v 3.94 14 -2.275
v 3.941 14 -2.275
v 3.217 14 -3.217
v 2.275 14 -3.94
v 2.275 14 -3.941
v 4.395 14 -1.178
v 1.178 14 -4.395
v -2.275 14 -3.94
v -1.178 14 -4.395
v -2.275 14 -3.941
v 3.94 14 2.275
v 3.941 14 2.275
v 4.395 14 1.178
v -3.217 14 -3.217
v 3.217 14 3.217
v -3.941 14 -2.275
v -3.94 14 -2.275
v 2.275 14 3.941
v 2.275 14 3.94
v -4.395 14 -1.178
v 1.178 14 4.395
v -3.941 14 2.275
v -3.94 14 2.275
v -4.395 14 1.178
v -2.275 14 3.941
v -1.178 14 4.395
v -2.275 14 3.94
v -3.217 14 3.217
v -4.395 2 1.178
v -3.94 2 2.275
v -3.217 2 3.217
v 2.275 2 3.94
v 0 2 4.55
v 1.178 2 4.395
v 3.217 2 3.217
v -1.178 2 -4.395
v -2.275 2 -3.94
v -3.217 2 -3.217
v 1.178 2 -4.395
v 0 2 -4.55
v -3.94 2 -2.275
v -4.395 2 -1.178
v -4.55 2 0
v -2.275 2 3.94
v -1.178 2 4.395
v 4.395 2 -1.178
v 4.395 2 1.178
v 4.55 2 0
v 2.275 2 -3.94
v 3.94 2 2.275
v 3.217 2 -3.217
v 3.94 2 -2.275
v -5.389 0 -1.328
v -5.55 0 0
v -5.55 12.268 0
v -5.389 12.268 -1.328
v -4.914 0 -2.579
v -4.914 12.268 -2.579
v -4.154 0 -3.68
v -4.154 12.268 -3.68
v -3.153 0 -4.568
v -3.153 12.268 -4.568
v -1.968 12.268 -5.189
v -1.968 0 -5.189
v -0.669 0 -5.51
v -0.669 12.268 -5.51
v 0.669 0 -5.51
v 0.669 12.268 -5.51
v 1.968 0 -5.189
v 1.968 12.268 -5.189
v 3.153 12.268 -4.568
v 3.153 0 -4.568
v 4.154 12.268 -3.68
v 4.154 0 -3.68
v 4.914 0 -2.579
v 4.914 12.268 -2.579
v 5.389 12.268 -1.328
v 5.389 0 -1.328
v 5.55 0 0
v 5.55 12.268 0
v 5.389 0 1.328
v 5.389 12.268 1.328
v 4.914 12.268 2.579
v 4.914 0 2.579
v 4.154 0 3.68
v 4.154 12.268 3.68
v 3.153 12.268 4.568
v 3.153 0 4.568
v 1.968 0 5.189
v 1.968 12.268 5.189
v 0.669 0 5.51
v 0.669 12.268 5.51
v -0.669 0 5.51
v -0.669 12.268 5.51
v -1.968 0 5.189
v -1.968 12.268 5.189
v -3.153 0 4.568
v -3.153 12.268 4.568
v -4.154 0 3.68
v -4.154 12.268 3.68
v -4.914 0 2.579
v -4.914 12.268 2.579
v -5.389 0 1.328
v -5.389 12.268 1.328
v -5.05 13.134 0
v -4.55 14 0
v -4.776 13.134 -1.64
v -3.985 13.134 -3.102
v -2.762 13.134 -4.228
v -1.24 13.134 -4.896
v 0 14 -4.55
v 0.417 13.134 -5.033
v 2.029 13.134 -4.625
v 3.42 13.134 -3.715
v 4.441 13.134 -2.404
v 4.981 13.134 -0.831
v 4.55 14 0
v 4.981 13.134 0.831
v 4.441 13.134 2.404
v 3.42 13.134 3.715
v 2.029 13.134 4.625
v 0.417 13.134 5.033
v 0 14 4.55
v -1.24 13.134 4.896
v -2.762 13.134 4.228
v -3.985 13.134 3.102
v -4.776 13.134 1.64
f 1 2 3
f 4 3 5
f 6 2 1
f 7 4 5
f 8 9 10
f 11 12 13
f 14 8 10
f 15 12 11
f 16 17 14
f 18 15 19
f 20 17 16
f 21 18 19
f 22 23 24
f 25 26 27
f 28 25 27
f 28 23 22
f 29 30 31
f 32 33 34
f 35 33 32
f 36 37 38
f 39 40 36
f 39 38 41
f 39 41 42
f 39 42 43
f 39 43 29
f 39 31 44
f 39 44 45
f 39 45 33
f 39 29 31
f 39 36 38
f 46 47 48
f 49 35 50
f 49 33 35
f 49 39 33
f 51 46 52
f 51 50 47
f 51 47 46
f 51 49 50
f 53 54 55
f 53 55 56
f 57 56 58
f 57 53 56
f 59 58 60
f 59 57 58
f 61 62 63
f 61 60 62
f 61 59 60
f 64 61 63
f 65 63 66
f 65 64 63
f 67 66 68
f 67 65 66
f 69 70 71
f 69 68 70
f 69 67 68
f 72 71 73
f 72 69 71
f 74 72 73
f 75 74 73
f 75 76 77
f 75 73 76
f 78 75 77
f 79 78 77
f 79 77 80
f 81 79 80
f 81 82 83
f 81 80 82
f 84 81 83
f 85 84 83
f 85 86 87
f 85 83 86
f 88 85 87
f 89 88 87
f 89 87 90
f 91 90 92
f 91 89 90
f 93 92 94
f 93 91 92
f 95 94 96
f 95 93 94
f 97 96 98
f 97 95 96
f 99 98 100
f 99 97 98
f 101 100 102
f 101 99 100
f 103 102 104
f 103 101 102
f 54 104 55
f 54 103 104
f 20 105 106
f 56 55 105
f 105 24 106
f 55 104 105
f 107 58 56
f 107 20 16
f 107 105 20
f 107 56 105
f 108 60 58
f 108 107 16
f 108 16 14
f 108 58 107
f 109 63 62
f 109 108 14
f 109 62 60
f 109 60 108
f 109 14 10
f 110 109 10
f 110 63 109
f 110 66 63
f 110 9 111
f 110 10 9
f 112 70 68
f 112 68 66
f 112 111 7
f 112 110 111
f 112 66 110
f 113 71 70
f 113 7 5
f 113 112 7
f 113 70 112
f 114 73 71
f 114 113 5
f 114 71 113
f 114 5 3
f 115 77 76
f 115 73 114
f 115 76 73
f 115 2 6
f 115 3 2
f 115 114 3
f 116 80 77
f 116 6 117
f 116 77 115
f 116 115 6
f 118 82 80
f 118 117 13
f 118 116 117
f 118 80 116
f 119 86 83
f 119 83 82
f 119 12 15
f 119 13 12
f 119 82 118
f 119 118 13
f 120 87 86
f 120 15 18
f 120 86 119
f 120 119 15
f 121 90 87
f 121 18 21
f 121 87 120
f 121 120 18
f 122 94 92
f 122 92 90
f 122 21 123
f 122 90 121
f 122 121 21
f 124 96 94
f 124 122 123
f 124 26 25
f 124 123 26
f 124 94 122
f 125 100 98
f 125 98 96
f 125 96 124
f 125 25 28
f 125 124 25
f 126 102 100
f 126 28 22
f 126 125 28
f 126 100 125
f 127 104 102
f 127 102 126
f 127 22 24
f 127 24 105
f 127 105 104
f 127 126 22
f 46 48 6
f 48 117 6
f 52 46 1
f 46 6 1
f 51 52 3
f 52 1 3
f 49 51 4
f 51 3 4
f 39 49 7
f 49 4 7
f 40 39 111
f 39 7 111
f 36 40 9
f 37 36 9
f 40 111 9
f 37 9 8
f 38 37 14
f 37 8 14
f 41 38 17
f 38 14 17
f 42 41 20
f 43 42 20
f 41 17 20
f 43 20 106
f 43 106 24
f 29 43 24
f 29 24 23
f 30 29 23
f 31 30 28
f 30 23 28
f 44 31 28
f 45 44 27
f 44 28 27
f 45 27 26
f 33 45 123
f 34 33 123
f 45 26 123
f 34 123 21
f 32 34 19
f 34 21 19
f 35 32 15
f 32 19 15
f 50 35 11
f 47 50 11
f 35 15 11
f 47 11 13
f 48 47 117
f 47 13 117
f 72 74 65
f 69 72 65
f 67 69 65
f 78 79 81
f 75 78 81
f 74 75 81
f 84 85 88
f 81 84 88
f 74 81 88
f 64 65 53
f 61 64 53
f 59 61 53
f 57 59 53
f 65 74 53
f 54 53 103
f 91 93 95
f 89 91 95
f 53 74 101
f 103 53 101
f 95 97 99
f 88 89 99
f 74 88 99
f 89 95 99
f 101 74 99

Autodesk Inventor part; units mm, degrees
ref_plane "YZ Plane" through (0, 0, 0) normal (1, 0, 0) x (0, 1, 0)
ref_plane "XZ Plane" through (0, 0, 0) normal (0, 1, 0) x (-1, 0, 0)
ref_plane "XY Plane" through (0, 0, 0) normal (0, 0, 1) x (1, 0, 0)
sketch "Sketch1" plane through (0, 0, 0) normal (0, 1, 0) x (-1, 0, 0)
  circle A0 centre (0, 0) radius 5.55
  dimension "d0" = 11.1
extrude "Extrusion1" add sketch "Sketch1" along normal blind 14
sketch "Sketch2" plane through (0, 14, 0) normal (0, 1, 0) x (1, 0, 0)
  circle A0 centre (0, 0) radius 4.55
  circle A1 centre (0, 0) radius 5.55 projected
  dimension "d3" = 1
extrude "Extrusion2" cut sketch "Sketch2" against normal blind 12 contours A0
chamfer "Chamfer1" distance 1 angle 60 1 edges at (5.55, 14, 0) measured on face at (-5.1629, 14, -0.4427)
properties part number "Plug_3DPrint"
